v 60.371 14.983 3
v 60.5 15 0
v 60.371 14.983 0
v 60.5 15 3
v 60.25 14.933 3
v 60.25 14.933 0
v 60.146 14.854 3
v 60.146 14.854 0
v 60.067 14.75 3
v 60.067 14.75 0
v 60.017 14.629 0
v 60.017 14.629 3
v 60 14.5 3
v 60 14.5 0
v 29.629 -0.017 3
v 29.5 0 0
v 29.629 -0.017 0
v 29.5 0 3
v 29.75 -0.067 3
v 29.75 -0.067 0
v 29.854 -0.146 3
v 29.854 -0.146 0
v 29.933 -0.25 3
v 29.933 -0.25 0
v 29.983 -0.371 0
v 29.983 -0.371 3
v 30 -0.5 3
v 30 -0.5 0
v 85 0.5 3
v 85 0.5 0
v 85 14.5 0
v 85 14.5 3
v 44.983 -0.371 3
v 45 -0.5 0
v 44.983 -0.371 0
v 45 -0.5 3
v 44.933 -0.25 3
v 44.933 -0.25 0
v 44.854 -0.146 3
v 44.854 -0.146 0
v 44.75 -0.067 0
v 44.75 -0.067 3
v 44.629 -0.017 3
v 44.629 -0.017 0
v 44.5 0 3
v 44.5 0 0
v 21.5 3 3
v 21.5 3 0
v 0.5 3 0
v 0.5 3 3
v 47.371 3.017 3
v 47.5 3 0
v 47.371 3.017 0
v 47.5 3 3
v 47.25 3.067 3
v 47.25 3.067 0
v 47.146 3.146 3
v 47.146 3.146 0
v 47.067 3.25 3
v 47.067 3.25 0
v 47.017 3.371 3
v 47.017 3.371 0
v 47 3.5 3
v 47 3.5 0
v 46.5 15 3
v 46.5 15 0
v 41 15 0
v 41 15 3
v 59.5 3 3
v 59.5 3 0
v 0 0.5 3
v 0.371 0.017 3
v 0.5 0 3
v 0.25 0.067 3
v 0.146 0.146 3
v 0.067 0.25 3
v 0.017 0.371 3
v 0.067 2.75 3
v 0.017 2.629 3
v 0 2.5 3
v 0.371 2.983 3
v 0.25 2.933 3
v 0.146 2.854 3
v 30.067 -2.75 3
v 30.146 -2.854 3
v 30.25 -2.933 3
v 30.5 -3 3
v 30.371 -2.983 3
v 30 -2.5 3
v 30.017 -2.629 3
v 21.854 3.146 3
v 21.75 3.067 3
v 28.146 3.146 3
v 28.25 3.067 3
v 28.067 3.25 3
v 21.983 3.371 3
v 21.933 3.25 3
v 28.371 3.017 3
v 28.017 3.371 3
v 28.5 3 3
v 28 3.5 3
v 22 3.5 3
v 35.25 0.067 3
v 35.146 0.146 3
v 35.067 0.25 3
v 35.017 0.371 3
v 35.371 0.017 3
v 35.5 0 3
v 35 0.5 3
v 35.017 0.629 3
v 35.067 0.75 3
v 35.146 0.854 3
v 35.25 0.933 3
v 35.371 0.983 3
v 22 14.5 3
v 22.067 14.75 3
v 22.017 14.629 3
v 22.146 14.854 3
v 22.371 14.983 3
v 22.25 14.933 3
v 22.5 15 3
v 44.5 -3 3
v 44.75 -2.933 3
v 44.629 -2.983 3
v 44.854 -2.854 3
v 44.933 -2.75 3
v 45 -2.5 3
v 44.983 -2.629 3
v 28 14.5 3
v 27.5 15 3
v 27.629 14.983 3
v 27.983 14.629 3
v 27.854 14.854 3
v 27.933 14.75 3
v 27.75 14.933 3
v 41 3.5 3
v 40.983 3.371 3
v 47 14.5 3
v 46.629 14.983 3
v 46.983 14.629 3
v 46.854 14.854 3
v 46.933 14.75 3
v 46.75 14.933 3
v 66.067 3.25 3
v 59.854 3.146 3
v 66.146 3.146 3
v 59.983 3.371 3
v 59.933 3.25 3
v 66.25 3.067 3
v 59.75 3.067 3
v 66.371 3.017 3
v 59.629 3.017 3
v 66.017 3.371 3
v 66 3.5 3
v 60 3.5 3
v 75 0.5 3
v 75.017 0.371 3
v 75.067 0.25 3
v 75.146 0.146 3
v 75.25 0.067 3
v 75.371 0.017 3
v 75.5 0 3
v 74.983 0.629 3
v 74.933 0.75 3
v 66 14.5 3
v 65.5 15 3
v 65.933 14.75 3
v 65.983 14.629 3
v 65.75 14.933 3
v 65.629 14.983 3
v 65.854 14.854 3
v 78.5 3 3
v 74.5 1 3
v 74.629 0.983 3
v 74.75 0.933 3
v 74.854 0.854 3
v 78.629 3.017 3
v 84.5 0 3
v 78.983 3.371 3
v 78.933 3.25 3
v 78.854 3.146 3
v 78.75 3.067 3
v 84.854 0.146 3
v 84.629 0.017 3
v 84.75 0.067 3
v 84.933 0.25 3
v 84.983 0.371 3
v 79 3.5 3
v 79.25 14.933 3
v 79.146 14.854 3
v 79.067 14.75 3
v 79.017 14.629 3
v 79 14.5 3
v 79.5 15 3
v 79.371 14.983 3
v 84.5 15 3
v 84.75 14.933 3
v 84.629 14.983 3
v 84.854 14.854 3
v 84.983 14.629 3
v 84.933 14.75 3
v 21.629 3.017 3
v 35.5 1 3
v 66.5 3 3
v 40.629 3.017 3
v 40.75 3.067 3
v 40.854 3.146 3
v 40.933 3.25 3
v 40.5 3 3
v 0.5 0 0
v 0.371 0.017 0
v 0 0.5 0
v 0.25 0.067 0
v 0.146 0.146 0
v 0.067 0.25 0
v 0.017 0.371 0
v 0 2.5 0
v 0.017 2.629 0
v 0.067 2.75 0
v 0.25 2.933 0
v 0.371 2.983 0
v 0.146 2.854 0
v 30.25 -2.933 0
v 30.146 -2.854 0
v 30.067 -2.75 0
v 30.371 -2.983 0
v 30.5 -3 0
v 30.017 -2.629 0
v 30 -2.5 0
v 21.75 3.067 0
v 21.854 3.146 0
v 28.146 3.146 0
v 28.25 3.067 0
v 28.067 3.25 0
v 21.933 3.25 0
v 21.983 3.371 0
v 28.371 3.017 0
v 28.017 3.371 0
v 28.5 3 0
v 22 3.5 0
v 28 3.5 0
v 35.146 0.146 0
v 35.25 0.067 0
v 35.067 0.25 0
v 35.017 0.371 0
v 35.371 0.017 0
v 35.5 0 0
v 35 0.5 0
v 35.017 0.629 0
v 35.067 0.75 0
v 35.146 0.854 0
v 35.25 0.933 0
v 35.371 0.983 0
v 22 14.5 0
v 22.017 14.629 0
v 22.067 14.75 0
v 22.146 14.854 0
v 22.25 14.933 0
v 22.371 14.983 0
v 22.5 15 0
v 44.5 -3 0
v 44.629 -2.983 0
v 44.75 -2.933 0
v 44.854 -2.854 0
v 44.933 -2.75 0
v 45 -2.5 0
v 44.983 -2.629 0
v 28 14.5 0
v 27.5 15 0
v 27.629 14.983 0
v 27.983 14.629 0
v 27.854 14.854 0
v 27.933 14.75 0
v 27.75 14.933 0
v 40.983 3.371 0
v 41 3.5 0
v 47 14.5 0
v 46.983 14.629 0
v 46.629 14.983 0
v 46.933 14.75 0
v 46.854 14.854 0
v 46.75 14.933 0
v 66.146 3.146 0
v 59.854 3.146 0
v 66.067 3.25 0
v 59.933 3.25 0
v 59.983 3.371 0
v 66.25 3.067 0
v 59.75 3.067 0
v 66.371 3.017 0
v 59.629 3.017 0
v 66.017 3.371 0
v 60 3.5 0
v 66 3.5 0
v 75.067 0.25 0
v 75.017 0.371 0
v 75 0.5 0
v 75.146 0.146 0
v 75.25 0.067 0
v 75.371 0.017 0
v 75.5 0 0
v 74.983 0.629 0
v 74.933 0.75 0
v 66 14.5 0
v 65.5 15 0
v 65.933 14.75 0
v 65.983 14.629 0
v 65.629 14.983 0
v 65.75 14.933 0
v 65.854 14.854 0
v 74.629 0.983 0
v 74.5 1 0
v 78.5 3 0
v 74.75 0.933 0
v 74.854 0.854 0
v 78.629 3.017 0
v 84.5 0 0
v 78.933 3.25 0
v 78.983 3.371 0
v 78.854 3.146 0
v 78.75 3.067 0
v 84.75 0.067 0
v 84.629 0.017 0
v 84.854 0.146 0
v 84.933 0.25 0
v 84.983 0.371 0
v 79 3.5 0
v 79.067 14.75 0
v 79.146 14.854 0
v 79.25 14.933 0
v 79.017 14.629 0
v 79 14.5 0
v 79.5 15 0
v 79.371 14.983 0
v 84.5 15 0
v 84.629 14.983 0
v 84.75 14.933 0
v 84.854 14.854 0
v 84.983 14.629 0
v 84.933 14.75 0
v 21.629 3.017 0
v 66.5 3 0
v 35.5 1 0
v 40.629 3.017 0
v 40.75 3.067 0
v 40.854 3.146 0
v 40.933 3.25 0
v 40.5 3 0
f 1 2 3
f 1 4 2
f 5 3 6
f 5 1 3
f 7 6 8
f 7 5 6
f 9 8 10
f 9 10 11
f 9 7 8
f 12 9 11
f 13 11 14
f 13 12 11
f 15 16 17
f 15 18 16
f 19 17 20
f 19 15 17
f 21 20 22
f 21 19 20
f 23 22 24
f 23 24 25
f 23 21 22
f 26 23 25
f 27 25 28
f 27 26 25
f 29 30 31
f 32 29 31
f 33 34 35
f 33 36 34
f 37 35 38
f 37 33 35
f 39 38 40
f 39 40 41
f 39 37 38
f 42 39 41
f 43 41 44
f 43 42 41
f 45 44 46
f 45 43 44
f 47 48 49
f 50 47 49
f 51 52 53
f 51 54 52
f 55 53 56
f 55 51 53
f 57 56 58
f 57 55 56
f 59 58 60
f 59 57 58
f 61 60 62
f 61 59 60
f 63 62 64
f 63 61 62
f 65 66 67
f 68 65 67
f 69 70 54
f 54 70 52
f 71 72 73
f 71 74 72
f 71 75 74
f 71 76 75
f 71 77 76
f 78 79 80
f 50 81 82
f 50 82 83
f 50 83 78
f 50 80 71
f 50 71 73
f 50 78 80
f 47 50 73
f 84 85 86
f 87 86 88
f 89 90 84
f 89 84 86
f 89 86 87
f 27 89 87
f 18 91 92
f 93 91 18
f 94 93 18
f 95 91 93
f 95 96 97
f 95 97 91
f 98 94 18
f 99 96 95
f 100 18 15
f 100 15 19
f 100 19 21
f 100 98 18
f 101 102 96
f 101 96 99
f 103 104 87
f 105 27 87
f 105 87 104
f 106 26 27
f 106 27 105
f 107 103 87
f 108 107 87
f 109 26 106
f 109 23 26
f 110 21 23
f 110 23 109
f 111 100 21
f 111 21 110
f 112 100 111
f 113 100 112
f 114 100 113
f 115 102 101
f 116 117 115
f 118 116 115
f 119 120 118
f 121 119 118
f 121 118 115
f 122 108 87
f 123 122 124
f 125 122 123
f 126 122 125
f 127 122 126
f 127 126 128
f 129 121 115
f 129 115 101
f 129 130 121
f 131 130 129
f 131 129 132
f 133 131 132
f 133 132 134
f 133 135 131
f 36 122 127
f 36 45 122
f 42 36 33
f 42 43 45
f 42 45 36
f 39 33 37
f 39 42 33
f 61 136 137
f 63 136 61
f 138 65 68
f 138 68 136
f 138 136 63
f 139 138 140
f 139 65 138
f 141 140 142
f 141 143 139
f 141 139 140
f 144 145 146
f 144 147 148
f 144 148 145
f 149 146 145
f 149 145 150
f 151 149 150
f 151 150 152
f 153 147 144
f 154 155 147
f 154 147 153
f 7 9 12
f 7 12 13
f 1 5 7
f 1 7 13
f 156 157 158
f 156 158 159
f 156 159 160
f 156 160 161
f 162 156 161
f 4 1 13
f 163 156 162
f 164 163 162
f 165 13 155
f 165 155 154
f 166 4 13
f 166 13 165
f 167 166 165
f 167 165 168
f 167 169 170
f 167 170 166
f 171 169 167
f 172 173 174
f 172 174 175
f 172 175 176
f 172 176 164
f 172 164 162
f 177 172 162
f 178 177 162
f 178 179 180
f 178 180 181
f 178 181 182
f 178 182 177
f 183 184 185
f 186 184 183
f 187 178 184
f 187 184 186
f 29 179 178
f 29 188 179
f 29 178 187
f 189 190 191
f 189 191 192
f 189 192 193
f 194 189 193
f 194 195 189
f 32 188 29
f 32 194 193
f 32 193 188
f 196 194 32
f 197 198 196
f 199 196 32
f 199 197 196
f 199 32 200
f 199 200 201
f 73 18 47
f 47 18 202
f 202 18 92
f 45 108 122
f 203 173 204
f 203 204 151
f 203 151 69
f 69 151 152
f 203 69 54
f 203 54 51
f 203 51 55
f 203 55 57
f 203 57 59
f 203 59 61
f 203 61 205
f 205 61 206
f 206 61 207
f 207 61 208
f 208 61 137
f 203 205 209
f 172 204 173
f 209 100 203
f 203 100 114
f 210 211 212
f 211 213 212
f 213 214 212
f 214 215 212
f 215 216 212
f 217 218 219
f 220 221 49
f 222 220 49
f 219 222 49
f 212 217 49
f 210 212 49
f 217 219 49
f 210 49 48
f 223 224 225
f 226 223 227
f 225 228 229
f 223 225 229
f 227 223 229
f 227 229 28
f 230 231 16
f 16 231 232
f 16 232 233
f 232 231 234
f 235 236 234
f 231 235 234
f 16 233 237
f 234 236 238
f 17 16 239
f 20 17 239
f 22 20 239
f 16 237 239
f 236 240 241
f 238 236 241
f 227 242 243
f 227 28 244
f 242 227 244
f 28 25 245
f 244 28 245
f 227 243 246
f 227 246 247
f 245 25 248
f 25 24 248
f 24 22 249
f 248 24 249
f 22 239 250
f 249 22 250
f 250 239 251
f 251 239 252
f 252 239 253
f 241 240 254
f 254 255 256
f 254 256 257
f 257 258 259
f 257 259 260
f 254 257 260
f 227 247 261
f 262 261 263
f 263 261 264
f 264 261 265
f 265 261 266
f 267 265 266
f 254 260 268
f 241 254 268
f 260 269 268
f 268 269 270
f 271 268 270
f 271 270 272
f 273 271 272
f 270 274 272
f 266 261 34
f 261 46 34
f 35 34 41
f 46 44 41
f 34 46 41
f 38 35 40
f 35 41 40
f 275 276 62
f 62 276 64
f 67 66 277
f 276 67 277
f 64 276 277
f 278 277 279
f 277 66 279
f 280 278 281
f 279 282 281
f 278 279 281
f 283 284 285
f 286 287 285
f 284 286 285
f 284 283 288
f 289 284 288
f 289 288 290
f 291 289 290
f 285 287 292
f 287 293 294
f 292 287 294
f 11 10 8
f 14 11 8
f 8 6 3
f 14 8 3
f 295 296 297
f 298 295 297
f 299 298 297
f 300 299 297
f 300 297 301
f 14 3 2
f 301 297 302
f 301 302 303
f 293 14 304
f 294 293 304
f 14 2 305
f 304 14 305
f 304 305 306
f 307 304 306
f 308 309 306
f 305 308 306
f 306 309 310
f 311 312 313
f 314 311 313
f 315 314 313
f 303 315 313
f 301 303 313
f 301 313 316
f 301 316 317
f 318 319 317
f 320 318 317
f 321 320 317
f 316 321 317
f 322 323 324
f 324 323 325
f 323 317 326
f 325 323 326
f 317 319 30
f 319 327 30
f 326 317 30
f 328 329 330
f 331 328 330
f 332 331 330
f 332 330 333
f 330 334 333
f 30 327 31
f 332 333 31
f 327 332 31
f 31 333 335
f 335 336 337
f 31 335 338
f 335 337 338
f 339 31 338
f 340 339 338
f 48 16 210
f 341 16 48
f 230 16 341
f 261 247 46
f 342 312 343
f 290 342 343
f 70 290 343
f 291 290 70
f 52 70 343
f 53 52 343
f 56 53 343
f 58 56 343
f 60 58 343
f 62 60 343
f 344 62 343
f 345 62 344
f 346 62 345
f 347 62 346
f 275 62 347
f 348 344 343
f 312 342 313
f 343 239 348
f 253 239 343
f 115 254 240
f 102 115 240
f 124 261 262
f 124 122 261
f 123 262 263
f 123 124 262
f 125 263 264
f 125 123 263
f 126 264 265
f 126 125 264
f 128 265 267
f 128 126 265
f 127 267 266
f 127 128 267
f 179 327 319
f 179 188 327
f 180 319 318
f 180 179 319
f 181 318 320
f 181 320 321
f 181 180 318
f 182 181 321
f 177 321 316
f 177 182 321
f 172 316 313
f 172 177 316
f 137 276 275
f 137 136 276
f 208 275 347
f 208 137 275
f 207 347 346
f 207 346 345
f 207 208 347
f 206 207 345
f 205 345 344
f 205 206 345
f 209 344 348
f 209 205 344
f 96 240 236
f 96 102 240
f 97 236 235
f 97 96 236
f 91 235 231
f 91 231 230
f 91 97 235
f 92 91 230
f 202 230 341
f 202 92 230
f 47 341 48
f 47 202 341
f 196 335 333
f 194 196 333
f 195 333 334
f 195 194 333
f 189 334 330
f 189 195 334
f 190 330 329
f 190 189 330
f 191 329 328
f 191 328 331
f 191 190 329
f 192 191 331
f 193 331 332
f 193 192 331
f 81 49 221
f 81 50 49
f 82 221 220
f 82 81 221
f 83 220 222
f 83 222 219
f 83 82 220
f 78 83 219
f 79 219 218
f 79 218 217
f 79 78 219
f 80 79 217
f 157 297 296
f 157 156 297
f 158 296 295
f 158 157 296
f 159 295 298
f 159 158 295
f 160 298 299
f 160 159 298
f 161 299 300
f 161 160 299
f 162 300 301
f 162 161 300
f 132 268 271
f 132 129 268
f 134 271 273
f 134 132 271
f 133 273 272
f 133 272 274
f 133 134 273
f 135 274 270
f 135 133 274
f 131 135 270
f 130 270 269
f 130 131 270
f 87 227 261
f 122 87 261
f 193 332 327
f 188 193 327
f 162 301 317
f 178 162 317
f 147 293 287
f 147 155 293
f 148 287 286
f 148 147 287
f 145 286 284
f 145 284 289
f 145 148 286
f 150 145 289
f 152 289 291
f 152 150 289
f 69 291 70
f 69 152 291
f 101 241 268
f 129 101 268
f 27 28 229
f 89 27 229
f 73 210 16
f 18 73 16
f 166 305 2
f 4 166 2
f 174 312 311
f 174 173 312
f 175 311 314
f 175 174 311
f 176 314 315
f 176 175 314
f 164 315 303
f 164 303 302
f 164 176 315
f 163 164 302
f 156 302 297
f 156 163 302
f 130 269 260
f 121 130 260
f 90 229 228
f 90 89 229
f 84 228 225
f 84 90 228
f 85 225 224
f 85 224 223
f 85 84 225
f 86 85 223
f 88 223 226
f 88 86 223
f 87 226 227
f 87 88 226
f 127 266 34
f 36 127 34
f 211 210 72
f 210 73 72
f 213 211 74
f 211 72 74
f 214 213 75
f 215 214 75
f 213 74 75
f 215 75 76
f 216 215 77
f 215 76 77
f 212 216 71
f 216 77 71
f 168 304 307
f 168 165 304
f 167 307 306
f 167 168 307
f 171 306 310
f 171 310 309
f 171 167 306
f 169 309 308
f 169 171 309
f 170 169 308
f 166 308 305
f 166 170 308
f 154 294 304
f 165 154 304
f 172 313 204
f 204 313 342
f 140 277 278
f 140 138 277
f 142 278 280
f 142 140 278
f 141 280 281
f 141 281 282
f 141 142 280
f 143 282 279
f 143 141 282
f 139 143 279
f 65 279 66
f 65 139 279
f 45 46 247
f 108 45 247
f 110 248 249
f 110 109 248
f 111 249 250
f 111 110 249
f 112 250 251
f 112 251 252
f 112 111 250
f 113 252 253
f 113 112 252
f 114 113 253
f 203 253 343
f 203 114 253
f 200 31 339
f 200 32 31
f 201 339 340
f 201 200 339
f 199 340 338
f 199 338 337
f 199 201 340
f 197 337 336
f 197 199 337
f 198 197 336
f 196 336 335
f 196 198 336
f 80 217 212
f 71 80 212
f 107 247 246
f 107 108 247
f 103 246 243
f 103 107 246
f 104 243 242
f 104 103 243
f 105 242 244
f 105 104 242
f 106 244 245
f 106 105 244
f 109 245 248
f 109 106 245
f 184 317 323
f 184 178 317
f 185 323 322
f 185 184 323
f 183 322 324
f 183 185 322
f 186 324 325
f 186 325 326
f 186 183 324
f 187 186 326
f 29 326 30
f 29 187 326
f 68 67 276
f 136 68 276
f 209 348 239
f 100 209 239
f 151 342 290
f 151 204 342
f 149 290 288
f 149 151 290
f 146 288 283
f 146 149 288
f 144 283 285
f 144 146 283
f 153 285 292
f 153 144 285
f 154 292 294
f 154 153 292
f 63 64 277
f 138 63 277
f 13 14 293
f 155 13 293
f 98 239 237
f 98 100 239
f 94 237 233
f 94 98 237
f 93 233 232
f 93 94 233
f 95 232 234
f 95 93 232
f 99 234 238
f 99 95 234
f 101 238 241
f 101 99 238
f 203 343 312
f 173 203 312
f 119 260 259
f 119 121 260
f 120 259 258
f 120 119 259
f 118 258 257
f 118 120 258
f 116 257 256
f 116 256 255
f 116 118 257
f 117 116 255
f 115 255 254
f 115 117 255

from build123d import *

# Parameters (mm, degrees)
BOSS_EXTRUDE1_DEPTH = 3
FILLET1_R           = 0.5


with BuildPart() as part:
    # Sketch1 → Boss-Extrude1 (new body)
    with BuildSketch(Plane.XY):
        Polygon((0, 0), (30, 0), (30, -3), (45, -3), (45, 0), (35, 0), (35, 1), (75, 1), (75, 0), (85, 0), (85, 15), (79, 15), (79, 3), (66, 3), (66, 15), (60, 15), (60, 3), (47, 3), (47, 15), (41, 15), (41, 3), (28, 3), (28, 15), (22, 15), (22, 3), (0, 3), align=None)
    extrude(amount=BOSS_EXTRUDE1_DEPTH)

    # Fillet1
    fillet1_edges = [part.edges().sort_by_distance(p)[0] for p in [
        (22, 3, 1.5),
        (22, 15, 1.5),
        (28, 15, 1.5),
        (28, 3, 1.5),
        (41, 3, 1.5),
        (47, 15, 1.5),
        (47, 3, 1.5),
        (66, 3, 1.5),
        (60, 3, 1.5),
        (60, 15, 1.5),
        (66, 15, 1.5),
        (79, 3, 1.5),
        (79, 15, 1.5),
        (85, 15, 1.5),
        (85, 0, 1.5),
        (75, 1, 1.5),
        (75, 0, 1.5),
        (0, 3, 1.5),
        (0, 0, 1.5),
        (30, 0, 1.5),
        (30, -3, 1.5),
        (45, -3, 1.5),
        (45, 0, 1.5),
        (35, 0, 1.5),
        (35, 1, 1.5),
    ]]
    fillet(fillet1_edges, radius=FILLET1_R - 0.0001)  # a hair under: the kernel refuses the full size


solid = part.part
